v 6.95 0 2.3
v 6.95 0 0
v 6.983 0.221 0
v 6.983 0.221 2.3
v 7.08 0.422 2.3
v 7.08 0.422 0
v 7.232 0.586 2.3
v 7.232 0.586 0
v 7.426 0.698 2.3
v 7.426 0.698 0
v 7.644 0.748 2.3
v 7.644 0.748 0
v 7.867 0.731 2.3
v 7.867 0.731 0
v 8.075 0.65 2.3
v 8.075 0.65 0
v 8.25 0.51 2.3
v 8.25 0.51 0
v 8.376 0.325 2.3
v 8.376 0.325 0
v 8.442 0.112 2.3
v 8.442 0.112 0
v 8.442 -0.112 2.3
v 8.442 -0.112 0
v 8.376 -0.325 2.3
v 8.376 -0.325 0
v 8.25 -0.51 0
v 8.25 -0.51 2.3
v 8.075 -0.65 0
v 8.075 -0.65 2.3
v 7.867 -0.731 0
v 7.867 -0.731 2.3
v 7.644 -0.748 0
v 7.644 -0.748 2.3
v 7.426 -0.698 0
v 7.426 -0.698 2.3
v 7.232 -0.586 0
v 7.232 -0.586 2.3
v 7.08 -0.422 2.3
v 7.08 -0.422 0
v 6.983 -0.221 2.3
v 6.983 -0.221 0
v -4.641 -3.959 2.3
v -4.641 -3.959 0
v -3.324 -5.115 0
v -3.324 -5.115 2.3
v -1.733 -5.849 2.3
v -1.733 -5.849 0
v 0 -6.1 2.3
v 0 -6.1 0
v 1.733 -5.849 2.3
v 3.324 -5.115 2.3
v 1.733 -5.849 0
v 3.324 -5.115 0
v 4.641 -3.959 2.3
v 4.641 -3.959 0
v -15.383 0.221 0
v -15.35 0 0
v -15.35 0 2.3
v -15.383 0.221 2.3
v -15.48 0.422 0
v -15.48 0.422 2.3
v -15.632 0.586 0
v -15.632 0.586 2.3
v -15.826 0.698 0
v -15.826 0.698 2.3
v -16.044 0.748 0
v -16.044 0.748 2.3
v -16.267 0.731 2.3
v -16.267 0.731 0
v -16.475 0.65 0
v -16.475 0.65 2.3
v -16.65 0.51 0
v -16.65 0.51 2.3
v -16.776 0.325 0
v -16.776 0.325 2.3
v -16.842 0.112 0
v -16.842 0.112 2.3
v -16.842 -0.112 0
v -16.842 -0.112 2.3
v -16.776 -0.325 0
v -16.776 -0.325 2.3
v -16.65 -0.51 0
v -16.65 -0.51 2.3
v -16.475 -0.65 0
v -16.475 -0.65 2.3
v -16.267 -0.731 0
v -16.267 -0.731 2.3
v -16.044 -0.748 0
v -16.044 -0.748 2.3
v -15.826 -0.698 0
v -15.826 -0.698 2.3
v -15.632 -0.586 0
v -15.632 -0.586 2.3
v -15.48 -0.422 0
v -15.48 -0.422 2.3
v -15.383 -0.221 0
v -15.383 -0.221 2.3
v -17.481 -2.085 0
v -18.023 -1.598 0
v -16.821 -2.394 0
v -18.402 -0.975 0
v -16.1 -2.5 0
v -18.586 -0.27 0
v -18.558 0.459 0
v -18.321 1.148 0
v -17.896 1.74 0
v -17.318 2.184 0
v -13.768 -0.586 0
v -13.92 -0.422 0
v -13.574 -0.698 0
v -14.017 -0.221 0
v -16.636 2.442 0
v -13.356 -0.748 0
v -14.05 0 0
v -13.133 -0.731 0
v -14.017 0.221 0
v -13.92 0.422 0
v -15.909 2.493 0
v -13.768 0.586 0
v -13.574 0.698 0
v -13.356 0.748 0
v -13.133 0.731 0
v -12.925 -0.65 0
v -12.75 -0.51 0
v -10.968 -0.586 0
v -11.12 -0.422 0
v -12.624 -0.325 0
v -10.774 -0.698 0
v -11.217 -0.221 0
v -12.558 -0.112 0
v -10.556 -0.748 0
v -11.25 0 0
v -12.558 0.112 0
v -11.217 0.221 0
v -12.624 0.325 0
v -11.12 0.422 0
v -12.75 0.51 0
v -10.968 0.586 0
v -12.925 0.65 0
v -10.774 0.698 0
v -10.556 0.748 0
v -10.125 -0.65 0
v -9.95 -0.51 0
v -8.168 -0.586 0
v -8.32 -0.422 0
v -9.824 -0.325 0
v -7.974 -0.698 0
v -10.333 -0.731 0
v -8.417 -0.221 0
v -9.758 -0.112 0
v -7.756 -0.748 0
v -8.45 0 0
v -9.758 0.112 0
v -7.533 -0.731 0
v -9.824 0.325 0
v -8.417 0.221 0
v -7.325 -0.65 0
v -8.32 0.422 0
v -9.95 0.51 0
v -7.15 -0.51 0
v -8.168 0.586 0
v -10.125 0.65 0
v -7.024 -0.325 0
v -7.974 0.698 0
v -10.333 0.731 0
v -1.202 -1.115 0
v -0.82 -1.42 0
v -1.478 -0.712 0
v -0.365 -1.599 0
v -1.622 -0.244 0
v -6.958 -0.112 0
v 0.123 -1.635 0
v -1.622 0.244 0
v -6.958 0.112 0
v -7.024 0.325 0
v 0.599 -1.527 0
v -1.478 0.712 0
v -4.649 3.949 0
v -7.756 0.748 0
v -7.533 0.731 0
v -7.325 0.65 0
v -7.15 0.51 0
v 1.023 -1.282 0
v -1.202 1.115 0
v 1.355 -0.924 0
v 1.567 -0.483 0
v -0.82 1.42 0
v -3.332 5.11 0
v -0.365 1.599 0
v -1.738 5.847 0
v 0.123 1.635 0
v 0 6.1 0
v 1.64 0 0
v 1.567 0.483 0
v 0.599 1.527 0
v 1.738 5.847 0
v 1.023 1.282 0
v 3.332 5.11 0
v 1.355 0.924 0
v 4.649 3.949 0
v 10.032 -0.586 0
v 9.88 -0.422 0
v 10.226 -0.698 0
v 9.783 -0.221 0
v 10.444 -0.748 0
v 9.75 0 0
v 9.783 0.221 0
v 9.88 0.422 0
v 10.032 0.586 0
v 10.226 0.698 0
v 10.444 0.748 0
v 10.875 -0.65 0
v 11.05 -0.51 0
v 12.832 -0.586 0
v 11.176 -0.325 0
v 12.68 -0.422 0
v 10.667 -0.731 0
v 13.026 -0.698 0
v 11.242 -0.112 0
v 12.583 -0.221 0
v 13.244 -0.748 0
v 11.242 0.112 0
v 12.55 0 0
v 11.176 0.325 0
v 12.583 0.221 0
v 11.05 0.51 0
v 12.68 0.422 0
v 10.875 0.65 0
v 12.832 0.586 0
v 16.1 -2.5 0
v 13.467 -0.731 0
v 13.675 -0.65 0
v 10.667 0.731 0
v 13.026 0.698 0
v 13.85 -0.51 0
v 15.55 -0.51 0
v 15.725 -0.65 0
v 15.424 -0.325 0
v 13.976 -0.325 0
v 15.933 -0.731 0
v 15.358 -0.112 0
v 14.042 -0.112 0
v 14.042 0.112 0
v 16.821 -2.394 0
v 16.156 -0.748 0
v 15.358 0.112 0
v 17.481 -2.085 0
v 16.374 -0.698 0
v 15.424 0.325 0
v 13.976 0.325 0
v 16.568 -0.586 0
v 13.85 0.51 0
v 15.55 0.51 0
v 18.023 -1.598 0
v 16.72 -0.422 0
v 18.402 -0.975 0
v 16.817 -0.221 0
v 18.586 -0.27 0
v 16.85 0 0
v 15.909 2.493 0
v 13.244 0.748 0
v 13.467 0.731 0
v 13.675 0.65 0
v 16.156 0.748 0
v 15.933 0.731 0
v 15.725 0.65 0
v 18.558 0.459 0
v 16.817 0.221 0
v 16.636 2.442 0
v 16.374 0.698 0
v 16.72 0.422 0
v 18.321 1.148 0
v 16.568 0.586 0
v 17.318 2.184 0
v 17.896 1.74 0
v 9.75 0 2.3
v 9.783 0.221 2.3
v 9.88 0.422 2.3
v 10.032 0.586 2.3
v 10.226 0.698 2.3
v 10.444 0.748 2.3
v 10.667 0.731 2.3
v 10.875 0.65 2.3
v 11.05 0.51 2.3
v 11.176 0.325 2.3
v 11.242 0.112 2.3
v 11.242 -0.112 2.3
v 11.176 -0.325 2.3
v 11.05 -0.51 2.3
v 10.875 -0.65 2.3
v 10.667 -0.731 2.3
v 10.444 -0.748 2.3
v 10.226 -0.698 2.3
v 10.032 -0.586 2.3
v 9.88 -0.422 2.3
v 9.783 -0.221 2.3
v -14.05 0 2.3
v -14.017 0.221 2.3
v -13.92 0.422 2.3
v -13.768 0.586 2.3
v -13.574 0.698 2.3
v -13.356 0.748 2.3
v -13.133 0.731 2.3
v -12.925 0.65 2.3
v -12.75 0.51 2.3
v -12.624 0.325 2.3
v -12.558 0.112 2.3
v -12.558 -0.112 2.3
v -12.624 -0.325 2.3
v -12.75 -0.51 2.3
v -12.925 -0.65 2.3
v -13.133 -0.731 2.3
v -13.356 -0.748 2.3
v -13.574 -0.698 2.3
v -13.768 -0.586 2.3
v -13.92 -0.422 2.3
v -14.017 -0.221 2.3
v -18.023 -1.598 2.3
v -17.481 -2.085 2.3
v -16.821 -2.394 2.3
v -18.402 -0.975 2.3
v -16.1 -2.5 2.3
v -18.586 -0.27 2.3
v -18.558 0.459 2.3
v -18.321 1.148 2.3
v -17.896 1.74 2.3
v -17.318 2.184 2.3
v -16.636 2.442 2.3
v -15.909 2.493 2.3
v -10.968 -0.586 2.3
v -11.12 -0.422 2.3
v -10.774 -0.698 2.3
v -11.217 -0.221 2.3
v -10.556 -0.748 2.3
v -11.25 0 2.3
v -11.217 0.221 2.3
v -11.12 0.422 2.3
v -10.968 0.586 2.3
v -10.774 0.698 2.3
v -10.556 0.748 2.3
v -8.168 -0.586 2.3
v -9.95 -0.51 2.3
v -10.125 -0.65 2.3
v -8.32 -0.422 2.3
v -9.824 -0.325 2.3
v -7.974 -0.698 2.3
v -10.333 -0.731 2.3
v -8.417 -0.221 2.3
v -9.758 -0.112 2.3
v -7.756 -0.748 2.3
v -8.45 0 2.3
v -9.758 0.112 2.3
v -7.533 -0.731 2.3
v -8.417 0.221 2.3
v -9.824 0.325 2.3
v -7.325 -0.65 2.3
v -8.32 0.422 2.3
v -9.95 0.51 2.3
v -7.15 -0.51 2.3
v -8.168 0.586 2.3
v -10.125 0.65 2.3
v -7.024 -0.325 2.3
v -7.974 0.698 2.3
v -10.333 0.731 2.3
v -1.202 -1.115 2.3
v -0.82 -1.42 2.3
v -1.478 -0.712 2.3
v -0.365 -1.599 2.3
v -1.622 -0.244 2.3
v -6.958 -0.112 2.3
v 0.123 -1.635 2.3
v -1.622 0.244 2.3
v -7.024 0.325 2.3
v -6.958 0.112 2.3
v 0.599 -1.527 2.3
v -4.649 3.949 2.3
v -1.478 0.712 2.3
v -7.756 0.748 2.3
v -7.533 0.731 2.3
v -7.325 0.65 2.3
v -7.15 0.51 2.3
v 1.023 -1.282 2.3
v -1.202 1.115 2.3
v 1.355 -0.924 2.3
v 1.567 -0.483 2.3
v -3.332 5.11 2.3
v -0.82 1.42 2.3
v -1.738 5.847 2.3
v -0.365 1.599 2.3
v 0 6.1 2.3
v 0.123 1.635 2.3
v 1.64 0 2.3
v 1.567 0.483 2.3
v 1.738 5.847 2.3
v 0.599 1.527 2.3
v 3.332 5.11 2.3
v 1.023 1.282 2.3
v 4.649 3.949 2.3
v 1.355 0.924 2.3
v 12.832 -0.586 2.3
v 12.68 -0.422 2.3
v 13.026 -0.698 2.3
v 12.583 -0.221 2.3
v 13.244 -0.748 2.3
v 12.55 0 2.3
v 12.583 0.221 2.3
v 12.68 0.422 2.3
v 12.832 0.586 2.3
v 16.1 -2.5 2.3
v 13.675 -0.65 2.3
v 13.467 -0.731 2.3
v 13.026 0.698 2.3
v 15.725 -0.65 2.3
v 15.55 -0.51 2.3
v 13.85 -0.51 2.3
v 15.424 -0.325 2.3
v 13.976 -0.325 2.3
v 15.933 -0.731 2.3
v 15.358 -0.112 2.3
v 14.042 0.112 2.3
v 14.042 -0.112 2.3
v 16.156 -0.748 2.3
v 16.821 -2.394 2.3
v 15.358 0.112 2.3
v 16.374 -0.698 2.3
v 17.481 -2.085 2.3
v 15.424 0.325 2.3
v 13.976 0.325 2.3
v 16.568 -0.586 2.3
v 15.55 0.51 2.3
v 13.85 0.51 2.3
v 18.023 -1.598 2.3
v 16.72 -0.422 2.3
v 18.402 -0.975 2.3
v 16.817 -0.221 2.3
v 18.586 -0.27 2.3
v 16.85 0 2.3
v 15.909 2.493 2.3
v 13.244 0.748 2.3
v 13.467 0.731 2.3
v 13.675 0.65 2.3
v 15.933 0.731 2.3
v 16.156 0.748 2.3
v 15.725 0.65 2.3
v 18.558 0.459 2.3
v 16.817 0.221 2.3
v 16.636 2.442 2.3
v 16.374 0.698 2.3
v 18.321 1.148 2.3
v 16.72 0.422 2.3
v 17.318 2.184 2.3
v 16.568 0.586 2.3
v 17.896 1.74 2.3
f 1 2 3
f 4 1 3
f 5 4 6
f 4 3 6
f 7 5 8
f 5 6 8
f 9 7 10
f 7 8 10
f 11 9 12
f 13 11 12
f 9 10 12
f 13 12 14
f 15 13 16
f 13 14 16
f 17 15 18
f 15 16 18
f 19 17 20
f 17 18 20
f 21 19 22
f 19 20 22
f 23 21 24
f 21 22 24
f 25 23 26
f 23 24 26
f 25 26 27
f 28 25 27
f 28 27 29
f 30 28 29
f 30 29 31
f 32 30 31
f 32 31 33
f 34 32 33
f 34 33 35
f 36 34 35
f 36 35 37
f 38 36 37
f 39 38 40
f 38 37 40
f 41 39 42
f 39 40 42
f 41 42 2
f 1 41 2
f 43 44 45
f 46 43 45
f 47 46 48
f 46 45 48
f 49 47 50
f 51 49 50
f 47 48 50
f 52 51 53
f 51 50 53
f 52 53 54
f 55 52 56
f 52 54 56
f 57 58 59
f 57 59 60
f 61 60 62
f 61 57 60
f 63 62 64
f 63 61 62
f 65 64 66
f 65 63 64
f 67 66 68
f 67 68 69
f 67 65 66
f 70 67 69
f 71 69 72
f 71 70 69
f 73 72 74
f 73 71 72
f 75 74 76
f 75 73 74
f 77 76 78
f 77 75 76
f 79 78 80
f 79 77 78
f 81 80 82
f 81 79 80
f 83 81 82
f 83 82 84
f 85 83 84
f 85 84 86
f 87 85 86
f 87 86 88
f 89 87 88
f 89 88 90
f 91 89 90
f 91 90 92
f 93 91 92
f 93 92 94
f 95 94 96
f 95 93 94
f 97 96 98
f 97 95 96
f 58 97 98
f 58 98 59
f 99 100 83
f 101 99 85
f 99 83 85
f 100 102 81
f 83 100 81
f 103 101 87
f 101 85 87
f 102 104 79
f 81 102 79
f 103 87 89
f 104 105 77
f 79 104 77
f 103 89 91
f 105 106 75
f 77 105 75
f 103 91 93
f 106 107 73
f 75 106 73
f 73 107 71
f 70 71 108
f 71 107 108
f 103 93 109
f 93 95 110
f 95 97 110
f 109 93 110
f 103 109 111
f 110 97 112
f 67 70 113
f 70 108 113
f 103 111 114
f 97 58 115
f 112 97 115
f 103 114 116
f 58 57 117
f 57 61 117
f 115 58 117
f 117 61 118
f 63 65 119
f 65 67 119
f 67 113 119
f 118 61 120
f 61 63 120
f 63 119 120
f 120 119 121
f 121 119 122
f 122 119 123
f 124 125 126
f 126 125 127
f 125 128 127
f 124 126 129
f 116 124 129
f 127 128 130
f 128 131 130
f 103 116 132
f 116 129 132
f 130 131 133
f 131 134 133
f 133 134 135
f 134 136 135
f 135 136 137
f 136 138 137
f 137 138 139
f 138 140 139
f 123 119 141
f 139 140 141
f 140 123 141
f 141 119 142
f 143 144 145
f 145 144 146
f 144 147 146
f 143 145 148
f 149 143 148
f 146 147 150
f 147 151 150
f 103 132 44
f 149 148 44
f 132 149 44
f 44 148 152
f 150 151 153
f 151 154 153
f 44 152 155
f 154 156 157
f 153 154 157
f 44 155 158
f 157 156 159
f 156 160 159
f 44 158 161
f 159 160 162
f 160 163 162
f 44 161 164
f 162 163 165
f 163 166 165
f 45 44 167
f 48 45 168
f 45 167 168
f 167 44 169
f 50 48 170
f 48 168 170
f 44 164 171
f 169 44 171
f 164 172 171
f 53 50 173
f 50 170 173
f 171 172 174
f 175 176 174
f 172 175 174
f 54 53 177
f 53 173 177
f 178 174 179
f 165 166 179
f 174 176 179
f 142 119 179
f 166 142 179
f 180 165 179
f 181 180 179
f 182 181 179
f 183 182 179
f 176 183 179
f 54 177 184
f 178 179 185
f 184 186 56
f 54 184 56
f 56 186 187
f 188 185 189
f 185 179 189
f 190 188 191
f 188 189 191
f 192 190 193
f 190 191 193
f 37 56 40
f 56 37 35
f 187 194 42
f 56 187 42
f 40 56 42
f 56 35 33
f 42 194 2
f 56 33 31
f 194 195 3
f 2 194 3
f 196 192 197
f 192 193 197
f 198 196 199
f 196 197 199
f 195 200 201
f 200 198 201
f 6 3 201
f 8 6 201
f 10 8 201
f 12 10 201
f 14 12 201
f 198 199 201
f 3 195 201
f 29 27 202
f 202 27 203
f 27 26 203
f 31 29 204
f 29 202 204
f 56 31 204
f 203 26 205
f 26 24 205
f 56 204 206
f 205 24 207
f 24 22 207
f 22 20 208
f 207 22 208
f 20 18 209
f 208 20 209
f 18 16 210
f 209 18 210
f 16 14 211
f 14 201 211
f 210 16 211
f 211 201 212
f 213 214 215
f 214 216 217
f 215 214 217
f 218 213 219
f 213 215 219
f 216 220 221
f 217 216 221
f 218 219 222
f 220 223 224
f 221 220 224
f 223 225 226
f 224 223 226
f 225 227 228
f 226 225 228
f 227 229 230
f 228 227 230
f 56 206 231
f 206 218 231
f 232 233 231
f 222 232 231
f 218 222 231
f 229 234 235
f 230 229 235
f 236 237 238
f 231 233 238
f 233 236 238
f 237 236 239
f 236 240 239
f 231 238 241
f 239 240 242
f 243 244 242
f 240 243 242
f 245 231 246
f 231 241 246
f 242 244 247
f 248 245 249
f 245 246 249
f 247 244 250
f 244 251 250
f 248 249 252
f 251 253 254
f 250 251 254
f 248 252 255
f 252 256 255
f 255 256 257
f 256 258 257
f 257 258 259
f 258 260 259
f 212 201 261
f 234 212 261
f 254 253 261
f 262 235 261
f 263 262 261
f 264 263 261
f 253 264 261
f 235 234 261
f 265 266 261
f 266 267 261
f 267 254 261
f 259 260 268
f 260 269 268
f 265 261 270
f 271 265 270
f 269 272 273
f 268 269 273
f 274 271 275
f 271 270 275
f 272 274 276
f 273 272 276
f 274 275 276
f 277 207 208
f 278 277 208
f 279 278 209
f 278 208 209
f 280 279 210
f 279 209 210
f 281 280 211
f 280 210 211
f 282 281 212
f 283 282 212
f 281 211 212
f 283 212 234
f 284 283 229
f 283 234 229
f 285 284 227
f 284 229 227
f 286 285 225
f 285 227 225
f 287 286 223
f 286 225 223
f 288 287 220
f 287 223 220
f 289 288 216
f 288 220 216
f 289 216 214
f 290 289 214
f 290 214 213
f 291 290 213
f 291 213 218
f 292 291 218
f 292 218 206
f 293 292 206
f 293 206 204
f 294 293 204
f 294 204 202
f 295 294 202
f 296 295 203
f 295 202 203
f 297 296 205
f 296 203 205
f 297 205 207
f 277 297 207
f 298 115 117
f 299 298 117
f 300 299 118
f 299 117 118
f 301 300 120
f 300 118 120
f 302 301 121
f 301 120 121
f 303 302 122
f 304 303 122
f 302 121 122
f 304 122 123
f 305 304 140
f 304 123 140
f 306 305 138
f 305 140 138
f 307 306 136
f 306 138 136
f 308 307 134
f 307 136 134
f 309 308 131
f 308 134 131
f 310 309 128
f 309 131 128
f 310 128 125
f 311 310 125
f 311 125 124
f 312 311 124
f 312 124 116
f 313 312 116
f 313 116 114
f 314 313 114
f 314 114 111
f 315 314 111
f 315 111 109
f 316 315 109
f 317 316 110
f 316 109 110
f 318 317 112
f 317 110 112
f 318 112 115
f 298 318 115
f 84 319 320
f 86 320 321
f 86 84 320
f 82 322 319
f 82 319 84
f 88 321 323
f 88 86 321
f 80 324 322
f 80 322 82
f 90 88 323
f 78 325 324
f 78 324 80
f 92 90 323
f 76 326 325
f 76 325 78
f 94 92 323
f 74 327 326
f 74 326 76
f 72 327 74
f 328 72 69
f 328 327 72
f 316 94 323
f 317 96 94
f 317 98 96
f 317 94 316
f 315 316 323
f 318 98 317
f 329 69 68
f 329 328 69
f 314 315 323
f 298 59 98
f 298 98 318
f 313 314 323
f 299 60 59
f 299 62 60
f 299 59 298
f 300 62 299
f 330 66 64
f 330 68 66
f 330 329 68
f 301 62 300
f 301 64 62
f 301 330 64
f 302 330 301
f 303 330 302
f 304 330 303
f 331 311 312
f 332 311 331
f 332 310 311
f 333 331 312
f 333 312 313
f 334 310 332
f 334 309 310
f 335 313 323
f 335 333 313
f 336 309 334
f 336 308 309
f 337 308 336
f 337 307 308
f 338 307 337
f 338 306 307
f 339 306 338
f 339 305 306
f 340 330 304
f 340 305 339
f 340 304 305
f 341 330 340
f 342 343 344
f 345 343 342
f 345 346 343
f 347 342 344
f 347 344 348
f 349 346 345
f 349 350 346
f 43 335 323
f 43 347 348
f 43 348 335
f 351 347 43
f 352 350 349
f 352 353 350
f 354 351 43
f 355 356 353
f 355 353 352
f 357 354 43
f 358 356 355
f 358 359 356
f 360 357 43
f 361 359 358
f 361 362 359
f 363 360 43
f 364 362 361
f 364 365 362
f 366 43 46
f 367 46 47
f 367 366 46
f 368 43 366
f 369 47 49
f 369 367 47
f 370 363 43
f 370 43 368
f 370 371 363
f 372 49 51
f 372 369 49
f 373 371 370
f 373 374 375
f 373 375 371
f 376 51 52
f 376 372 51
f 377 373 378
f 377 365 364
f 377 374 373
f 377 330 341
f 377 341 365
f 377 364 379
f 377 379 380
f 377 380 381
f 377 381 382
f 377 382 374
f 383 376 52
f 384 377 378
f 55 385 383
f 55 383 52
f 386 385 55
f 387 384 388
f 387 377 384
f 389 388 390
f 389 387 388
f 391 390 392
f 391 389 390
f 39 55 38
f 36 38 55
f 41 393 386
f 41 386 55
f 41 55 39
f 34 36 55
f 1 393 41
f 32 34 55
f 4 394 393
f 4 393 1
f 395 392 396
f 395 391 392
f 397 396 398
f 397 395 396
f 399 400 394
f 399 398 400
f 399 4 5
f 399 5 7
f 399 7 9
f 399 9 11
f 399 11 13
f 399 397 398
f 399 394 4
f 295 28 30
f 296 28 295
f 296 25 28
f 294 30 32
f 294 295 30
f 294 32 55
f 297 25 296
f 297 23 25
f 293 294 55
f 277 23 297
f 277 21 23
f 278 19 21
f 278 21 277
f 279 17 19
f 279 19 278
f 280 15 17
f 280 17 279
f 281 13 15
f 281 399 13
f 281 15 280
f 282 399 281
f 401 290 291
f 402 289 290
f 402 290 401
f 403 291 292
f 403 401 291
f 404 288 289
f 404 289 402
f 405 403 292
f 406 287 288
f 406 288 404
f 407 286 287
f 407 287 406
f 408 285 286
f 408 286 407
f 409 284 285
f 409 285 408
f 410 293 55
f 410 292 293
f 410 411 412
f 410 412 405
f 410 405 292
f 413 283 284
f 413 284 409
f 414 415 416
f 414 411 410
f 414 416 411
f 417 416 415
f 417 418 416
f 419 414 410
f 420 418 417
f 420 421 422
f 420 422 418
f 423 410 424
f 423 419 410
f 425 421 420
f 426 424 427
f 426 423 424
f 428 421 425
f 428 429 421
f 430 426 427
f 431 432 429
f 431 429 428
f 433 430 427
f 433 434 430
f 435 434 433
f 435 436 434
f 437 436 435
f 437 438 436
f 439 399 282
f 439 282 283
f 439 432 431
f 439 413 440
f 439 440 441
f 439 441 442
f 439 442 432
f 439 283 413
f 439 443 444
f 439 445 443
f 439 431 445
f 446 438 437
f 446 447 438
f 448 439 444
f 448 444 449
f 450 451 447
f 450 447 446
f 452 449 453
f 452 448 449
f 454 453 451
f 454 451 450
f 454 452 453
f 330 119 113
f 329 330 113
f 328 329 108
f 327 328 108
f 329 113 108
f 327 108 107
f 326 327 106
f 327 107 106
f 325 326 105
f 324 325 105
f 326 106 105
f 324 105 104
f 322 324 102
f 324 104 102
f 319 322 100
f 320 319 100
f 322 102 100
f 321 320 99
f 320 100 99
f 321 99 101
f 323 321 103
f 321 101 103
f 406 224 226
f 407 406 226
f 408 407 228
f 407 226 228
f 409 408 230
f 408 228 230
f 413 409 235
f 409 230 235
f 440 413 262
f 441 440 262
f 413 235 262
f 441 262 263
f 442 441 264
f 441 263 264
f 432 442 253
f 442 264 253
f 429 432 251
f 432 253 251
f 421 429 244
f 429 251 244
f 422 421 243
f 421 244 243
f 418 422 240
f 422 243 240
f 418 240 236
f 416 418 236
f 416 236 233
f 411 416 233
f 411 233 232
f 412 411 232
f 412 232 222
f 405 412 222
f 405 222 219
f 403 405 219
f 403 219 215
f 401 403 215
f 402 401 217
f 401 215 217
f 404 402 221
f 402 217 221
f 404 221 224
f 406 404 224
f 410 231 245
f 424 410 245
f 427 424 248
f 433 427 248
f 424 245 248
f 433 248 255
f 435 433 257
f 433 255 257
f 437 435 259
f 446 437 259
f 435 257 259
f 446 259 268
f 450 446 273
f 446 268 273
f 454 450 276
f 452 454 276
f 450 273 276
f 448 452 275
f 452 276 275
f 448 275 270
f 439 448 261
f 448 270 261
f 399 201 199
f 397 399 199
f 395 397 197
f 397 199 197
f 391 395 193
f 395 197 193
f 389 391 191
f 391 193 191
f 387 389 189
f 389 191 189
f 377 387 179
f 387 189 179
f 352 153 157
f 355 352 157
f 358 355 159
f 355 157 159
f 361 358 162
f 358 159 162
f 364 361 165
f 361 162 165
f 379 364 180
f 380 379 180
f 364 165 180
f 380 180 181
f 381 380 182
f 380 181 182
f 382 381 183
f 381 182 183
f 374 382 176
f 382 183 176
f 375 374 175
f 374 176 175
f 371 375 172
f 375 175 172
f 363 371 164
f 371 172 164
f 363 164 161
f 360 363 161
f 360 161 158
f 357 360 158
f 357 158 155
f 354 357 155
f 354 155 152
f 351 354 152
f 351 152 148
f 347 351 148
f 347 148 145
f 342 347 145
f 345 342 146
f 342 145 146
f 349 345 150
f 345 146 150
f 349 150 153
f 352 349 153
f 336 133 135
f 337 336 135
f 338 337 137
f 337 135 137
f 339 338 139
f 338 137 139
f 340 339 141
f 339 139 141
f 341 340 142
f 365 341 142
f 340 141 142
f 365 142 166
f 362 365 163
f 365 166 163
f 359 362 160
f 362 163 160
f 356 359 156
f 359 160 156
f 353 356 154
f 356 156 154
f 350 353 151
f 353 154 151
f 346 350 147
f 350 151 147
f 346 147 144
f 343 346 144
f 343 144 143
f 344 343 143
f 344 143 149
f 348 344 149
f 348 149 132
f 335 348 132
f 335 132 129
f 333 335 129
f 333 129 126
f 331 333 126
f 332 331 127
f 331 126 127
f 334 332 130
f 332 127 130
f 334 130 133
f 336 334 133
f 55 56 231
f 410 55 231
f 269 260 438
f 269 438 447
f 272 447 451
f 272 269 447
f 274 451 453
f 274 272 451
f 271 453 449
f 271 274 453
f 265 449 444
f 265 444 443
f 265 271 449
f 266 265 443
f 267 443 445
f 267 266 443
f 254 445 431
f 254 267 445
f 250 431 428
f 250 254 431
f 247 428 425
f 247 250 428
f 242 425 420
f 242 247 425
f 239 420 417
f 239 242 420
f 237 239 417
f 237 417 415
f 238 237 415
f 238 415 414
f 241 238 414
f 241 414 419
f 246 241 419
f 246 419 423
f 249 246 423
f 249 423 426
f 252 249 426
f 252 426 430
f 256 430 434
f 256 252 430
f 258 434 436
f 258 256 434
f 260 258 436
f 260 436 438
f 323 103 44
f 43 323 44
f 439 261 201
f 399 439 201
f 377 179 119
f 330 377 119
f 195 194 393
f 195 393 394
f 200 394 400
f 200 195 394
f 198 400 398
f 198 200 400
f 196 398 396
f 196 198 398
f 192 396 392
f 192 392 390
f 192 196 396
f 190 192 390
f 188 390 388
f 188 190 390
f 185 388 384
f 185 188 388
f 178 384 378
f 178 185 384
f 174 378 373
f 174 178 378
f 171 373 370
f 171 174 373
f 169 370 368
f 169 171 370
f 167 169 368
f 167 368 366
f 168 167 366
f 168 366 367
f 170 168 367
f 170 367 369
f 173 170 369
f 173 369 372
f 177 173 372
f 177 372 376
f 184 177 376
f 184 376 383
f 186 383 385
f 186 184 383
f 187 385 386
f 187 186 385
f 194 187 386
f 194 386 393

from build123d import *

# Parameters (mm, degrees)
SKETCH1_R           = 0.75
SKETCH1_R_2         = 1.64
BOSS_EXTRUDE1_DEPTH = 2.3


with BuildPart() as part:
    # Sketch1 → Boss-Extrude1 (new body)
    with BuildSketch(Plane.XY):
        with BuildLine():
            Line((-16.1, -2.500431312), (-4.640508927, -3.959252063))
            ThreePointArc((-4.640508927, -3.959252063), (0, -6.1), (4.640508927, -3.959252063))
            Line((4.640508927, -3.959252063), (16.1, -2.500431312))
            ThreePointArc((16.1, -2.500431312), (18.598607316, 0.095489412), (15.90916049, 2.493137988))
            Line((15.90916049, 2.493137988), (4.649322288, 3.948898867))
            ThreePointArc((4.649322288, 3.948898867), (0, 6.1), (-4.649322288, 3.948898867))
            Line((-4.649322288, 3.948898867), (-15.90916049, 2.493137988))
            ThreePointArc((-15.90916049, 2.493137988), (-18.598607316, 0.095489412), (-16.1, -2.500431312))
        make_face()
        with Locations((-16.1, 0)):
            Circle(SKETCH1_R, mode=Mode.SUBTRACT)
        with BuildLine():
            ThreePointArc((-12.55, 0), (-13.3, -0.75), (-14.05, 0))
            ThreePointArc((-14.05, 0), (-13.3, 0.75), (-12.55, 0))
        make_face(mode=Mode.SUBTRACT)
        with BuildLine():
            ThreePointArc((-9.75, 0), (-10.5, -0.75), (-11.25, 0))
            ThreePointArc((-11.25, 0), (-10.5, 0.75), (-9.75, 0))
        make_face(mode=Mode.SUBTRACT)
        with BuildLine():
            ThreePointArc((-6.95, 0), (-7.7, -0.75), (-8.45, 0))
            ThreePointArc((-8.45, 0), (-7.7, 0.75), (-6.95, 0))
        make_face(mode=Mode.SUBTRACT)
        Circle(SKETCH1_R_2, mode=Mode.SUBTRACT)
        with BuildLine():
            ThreePointArc((8.45, 0), (7.7, -0.75), (6.95, 0))
            ThreePointArc((6.95, 0), (7.7, 0.75), (8.45, 0))
        make_face(mode=Mode.SUBTRACT)
        with BuildLine():
            ThreePointArc((11.25, 0), (10.5, -0.75), (9.75, 0))
            ThreePointArc((9.75, 0), (10.5, 0.75), (11.25, 0))
        make_face(mode=Mode.SUBTRACT)
        with BuildLine():
            ThreePointArc((14.05, 0), (13.3, -0.75), (12.55, 0))
            ThreePointArc((12.55, 0), (13.3, 0.75), (14.05, 0))
        make_face(mode=Mode.SUBTRACT)
        with Locations((16.1, 0)):
            Circle(SKETCH1_R, mode=Mode.SUBTRACT)
    extrude(amount=BOSS_EXTRUDE1_DEPTH)


solid = part.part
